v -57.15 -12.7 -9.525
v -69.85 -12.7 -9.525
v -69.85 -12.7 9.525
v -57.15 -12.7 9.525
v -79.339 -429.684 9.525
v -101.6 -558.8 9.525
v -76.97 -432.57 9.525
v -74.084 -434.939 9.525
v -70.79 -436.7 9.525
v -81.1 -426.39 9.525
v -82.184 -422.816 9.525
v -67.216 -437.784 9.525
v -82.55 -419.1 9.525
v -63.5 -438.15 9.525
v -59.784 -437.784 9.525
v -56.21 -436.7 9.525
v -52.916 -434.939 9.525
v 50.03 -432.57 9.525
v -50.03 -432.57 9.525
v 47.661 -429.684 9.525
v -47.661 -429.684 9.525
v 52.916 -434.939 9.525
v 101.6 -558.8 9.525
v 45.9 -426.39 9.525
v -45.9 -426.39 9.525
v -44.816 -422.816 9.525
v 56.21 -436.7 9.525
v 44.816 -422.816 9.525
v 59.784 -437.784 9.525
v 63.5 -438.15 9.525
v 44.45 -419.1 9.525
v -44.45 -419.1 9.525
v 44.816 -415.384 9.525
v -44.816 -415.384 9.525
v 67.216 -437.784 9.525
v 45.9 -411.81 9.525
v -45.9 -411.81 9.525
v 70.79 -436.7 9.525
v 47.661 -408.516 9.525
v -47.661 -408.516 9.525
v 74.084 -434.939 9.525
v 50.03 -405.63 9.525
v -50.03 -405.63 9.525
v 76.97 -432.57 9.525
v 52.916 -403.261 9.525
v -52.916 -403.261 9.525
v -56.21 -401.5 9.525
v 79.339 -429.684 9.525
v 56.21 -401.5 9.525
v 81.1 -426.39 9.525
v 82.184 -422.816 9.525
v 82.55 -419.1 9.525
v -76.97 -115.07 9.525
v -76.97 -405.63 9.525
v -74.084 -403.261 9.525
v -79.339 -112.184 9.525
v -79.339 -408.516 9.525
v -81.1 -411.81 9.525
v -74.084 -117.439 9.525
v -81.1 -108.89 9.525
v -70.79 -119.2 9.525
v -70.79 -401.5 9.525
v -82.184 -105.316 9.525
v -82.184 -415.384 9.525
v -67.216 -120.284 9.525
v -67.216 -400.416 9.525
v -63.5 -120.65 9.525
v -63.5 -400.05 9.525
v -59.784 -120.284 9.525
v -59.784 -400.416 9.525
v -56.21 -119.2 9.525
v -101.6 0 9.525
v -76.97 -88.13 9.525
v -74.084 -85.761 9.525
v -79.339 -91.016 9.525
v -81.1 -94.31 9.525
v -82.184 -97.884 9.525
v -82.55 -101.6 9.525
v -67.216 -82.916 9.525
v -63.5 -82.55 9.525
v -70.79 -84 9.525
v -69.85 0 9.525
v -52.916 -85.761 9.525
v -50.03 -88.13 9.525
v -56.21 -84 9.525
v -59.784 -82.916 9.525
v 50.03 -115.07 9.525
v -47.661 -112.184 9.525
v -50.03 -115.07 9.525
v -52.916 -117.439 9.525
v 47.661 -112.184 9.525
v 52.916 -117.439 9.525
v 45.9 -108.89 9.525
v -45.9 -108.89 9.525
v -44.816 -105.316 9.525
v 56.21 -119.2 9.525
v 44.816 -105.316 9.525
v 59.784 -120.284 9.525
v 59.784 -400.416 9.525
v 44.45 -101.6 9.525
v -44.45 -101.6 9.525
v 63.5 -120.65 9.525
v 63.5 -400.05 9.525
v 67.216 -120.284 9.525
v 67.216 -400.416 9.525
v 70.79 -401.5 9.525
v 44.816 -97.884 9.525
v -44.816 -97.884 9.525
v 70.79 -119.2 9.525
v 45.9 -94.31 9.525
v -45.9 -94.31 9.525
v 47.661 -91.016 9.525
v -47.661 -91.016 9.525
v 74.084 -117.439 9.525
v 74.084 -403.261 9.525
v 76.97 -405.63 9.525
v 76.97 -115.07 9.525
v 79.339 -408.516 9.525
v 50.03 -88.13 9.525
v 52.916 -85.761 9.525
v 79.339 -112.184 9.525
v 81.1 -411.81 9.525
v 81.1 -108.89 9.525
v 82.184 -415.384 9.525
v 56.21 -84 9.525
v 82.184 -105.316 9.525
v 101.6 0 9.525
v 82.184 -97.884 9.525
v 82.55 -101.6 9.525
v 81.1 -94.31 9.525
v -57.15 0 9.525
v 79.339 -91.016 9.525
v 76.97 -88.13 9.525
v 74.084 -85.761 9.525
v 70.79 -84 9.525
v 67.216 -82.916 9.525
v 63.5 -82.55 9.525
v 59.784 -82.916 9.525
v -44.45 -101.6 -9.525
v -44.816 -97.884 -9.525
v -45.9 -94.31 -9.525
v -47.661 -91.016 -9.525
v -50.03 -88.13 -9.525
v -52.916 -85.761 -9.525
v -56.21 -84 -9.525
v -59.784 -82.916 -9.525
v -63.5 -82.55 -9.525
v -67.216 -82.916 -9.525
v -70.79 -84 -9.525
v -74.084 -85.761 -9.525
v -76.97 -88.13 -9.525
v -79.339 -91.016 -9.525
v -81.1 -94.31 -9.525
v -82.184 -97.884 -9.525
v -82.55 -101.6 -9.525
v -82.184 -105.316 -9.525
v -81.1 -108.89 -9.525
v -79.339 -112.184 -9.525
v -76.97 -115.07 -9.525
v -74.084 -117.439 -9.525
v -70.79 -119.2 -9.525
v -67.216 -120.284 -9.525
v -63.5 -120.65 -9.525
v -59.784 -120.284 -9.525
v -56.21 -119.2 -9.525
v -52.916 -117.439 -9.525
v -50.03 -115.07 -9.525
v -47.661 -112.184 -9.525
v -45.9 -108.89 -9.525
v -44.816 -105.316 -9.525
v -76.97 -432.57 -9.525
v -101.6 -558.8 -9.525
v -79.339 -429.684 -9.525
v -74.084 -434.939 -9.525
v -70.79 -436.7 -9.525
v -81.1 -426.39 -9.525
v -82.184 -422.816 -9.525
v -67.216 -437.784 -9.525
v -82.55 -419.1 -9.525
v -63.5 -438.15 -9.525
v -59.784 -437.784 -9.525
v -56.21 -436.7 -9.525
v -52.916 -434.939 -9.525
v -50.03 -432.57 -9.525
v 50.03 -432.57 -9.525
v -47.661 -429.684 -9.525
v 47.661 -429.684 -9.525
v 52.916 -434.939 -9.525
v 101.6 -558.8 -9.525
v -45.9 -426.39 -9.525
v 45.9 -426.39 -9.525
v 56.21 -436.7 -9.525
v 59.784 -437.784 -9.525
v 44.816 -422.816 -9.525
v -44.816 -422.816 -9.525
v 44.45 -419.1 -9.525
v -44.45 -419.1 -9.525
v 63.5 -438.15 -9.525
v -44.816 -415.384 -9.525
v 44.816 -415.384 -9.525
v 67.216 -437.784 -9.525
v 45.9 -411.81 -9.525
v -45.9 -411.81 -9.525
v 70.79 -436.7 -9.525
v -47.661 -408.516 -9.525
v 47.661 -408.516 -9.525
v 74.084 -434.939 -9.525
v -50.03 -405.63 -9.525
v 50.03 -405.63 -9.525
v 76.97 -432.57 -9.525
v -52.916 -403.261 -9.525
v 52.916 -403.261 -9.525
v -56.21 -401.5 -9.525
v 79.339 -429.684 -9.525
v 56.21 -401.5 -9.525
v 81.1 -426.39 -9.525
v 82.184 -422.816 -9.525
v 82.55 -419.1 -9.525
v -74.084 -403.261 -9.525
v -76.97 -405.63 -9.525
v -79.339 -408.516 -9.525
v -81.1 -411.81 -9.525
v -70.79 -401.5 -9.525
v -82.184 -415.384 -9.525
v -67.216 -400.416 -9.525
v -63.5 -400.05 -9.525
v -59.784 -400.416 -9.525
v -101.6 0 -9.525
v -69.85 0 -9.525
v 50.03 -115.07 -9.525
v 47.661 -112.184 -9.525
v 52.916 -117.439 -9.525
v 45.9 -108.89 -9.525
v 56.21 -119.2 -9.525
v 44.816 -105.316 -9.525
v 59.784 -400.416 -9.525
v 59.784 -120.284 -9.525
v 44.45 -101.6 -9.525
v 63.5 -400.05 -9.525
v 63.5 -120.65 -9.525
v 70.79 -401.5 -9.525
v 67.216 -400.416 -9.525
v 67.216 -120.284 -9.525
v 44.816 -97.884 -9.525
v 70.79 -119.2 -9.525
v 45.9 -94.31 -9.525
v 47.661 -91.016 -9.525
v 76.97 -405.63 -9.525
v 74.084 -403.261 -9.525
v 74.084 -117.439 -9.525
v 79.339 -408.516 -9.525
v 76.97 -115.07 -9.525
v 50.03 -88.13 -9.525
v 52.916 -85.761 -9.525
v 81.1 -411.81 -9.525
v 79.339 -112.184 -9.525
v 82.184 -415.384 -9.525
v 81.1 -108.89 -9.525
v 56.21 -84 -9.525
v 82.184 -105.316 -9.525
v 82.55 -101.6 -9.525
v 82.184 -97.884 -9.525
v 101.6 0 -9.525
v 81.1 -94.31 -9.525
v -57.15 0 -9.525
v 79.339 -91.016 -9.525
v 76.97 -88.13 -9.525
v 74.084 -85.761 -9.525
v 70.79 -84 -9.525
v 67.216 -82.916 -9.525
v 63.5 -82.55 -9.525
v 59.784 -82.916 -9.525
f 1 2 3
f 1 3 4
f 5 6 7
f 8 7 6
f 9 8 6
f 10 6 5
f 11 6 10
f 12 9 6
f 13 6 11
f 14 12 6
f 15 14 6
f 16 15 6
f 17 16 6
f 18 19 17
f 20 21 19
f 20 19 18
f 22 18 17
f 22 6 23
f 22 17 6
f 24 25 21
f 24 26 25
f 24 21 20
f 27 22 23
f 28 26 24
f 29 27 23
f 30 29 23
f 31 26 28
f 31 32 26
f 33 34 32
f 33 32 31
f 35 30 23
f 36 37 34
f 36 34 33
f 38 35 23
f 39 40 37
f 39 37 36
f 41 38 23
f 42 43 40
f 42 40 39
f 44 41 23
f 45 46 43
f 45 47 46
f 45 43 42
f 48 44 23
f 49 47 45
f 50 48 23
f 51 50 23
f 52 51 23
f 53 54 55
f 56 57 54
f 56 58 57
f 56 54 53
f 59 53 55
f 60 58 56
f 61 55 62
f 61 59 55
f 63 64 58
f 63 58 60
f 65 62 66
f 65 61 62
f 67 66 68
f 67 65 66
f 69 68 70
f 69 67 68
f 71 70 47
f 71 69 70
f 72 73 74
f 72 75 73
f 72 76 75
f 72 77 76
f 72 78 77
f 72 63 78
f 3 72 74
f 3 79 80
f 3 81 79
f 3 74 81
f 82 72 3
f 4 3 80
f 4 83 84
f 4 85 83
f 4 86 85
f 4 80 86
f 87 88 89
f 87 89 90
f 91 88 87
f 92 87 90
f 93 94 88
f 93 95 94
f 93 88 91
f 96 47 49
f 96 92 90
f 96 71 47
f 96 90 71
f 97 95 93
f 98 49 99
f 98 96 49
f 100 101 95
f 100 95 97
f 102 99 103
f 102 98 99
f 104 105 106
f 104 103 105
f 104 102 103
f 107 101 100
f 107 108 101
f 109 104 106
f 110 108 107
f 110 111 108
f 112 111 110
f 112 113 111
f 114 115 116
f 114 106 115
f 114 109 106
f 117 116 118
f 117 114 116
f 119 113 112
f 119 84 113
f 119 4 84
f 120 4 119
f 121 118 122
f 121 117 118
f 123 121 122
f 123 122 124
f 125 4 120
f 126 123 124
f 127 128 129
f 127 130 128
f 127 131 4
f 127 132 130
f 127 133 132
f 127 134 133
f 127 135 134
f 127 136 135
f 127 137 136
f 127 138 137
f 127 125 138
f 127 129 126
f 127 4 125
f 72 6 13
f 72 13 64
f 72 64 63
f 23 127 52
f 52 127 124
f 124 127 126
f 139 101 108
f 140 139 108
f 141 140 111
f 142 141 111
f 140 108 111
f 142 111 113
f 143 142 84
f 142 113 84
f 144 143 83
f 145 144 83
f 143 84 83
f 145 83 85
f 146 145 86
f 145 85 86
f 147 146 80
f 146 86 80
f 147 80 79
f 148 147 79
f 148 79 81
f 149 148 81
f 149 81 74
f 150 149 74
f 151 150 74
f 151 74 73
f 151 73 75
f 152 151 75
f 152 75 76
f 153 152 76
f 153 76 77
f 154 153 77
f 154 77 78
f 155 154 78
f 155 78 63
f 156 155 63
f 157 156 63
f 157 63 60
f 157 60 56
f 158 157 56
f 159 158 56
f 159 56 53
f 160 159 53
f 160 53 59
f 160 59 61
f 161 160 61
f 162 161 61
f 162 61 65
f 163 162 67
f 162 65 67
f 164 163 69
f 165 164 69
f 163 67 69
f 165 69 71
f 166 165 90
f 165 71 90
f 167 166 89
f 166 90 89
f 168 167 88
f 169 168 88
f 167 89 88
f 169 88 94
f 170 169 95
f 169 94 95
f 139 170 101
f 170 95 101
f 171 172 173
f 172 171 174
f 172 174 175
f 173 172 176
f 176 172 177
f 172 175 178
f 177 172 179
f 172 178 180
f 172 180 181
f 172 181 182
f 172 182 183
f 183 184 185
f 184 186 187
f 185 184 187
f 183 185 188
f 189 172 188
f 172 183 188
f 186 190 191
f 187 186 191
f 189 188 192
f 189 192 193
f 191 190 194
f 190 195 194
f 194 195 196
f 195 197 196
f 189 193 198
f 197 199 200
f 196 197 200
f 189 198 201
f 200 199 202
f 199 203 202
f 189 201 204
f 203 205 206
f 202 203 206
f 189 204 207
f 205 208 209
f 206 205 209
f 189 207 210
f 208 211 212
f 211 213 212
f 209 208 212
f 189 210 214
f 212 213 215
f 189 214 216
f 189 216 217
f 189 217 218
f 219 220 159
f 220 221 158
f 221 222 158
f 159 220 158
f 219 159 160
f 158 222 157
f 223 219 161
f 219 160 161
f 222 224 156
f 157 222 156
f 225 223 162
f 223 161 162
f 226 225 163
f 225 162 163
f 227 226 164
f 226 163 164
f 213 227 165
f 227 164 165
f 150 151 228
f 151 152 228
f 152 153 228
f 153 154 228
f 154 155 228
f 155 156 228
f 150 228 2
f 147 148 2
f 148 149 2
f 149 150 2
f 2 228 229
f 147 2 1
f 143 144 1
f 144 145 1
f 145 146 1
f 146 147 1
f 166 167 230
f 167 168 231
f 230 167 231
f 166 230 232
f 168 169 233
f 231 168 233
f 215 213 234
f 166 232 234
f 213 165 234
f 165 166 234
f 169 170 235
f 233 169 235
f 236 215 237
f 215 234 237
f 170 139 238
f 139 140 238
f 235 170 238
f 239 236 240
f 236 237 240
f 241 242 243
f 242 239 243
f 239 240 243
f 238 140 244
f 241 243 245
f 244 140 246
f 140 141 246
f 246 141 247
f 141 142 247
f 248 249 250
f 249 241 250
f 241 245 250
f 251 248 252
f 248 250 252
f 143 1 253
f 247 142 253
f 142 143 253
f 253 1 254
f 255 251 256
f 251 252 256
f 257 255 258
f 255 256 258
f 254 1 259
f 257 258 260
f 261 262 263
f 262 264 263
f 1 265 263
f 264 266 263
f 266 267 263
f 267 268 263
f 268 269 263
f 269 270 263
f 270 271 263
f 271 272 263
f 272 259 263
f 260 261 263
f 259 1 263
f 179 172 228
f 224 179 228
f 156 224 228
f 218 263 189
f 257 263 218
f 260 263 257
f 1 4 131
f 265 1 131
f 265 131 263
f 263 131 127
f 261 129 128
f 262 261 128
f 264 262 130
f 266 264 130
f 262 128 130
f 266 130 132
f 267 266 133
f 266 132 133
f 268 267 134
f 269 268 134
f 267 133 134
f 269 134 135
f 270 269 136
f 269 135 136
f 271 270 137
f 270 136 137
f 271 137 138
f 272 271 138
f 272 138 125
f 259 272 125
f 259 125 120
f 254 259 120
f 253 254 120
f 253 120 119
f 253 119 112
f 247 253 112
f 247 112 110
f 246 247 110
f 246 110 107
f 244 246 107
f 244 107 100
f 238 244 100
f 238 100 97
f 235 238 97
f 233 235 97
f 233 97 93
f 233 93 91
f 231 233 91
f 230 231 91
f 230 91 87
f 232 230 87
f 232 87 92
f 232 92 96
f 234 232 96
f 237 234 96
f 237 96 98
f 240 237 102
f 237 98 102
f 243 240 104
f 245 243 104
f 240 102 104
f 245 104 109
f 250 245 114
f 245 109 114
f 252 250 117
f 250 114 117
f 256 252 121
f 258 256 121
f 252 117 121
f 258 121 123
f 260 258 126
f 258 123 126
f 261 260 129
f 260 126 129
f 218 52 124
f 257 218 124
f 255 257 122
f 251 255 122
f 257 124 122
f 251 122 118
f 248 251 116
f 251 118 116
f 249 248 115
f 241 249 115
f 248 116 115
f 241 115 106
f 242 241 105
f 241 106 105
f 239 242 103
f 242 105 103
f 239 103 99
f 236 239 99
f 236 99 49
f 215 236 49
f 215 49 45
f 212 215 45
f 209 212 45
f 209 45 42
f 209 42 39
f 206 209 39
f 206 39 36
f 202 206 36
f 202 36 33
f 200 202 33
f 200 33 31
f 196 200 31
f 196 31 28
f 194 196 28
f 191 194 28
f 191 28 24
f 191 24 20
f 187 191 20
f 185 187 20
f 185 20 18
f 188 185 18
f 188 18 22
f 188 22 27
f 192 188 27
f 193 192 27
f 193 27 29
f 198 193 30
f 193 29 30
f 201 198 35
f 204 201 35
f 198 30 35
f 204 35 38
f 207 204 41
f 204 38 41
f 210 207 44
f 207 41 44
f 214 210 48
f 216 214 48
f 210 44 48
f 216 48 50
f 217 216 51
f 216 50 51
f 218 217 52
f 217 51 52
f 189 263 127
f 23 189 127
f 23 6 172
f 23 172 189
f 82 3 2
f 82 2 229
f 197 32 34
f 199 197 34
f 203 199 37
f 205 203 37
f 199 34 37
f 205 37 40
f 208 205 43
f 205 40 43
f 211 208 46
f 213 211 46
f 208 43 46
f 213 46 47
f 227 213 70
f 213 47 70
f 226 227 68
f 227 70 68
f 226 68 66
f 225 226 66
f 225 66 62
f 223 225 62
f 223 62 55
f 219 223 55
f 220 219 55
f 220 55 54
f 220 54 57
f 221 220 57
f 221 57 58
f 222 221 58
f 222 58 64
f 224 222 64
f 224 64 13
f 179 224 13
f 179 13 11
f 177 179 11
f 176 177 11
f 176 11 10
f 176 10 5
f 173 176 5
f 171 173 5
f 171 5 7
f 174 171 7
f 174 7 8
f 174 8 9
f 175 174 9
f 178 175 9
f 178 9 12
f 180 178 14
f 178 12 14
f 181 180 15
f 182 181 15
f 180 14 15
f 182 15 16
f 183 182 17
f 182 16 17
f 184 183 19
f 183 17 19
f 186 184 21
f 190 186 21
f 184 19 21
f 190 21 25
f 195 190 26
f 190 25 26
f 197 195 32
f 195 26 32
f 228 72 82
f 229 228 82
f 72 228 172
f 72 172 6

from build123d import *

# Parameters (mm, degrees)
F0_W     = 203.2
F0_H     = 19.05
F1_DEPTH = 558.8
F2_R     = 19.05
F2_W     = 12.7
F2_H     = 12.7
F3_DEPTH = 25.4


with BuildPart() as f1:
    # F0 (on Front) → F1 (new body)
    with BuildSketch(Plane.XZ):
        Rectangle(F0_W, F0_H)
    extrude(amount=F1_DEPTH)

    # F2 (on face) → F3 (cut)
    with BuildSketch(Plane.XY.offset(9.525)):
        with Locations((-63.5, -101.6)):
            Circle(F2_R)
        with Locations((63.5, -101.6)):
            Circle(F2_R)
        with Locations((-63.5, -419.1)):
            Circle(F2_R)
        with Locations((63.5, -419.1)):
            Circle(F2_R)
        with Locations((-63.5, -6.35)):
            Rectangle(F2_W, F2_H)
    extrude(amount=-F3_DEPTH, mode=Mode.SUBTRACT)


solid = f1.part
